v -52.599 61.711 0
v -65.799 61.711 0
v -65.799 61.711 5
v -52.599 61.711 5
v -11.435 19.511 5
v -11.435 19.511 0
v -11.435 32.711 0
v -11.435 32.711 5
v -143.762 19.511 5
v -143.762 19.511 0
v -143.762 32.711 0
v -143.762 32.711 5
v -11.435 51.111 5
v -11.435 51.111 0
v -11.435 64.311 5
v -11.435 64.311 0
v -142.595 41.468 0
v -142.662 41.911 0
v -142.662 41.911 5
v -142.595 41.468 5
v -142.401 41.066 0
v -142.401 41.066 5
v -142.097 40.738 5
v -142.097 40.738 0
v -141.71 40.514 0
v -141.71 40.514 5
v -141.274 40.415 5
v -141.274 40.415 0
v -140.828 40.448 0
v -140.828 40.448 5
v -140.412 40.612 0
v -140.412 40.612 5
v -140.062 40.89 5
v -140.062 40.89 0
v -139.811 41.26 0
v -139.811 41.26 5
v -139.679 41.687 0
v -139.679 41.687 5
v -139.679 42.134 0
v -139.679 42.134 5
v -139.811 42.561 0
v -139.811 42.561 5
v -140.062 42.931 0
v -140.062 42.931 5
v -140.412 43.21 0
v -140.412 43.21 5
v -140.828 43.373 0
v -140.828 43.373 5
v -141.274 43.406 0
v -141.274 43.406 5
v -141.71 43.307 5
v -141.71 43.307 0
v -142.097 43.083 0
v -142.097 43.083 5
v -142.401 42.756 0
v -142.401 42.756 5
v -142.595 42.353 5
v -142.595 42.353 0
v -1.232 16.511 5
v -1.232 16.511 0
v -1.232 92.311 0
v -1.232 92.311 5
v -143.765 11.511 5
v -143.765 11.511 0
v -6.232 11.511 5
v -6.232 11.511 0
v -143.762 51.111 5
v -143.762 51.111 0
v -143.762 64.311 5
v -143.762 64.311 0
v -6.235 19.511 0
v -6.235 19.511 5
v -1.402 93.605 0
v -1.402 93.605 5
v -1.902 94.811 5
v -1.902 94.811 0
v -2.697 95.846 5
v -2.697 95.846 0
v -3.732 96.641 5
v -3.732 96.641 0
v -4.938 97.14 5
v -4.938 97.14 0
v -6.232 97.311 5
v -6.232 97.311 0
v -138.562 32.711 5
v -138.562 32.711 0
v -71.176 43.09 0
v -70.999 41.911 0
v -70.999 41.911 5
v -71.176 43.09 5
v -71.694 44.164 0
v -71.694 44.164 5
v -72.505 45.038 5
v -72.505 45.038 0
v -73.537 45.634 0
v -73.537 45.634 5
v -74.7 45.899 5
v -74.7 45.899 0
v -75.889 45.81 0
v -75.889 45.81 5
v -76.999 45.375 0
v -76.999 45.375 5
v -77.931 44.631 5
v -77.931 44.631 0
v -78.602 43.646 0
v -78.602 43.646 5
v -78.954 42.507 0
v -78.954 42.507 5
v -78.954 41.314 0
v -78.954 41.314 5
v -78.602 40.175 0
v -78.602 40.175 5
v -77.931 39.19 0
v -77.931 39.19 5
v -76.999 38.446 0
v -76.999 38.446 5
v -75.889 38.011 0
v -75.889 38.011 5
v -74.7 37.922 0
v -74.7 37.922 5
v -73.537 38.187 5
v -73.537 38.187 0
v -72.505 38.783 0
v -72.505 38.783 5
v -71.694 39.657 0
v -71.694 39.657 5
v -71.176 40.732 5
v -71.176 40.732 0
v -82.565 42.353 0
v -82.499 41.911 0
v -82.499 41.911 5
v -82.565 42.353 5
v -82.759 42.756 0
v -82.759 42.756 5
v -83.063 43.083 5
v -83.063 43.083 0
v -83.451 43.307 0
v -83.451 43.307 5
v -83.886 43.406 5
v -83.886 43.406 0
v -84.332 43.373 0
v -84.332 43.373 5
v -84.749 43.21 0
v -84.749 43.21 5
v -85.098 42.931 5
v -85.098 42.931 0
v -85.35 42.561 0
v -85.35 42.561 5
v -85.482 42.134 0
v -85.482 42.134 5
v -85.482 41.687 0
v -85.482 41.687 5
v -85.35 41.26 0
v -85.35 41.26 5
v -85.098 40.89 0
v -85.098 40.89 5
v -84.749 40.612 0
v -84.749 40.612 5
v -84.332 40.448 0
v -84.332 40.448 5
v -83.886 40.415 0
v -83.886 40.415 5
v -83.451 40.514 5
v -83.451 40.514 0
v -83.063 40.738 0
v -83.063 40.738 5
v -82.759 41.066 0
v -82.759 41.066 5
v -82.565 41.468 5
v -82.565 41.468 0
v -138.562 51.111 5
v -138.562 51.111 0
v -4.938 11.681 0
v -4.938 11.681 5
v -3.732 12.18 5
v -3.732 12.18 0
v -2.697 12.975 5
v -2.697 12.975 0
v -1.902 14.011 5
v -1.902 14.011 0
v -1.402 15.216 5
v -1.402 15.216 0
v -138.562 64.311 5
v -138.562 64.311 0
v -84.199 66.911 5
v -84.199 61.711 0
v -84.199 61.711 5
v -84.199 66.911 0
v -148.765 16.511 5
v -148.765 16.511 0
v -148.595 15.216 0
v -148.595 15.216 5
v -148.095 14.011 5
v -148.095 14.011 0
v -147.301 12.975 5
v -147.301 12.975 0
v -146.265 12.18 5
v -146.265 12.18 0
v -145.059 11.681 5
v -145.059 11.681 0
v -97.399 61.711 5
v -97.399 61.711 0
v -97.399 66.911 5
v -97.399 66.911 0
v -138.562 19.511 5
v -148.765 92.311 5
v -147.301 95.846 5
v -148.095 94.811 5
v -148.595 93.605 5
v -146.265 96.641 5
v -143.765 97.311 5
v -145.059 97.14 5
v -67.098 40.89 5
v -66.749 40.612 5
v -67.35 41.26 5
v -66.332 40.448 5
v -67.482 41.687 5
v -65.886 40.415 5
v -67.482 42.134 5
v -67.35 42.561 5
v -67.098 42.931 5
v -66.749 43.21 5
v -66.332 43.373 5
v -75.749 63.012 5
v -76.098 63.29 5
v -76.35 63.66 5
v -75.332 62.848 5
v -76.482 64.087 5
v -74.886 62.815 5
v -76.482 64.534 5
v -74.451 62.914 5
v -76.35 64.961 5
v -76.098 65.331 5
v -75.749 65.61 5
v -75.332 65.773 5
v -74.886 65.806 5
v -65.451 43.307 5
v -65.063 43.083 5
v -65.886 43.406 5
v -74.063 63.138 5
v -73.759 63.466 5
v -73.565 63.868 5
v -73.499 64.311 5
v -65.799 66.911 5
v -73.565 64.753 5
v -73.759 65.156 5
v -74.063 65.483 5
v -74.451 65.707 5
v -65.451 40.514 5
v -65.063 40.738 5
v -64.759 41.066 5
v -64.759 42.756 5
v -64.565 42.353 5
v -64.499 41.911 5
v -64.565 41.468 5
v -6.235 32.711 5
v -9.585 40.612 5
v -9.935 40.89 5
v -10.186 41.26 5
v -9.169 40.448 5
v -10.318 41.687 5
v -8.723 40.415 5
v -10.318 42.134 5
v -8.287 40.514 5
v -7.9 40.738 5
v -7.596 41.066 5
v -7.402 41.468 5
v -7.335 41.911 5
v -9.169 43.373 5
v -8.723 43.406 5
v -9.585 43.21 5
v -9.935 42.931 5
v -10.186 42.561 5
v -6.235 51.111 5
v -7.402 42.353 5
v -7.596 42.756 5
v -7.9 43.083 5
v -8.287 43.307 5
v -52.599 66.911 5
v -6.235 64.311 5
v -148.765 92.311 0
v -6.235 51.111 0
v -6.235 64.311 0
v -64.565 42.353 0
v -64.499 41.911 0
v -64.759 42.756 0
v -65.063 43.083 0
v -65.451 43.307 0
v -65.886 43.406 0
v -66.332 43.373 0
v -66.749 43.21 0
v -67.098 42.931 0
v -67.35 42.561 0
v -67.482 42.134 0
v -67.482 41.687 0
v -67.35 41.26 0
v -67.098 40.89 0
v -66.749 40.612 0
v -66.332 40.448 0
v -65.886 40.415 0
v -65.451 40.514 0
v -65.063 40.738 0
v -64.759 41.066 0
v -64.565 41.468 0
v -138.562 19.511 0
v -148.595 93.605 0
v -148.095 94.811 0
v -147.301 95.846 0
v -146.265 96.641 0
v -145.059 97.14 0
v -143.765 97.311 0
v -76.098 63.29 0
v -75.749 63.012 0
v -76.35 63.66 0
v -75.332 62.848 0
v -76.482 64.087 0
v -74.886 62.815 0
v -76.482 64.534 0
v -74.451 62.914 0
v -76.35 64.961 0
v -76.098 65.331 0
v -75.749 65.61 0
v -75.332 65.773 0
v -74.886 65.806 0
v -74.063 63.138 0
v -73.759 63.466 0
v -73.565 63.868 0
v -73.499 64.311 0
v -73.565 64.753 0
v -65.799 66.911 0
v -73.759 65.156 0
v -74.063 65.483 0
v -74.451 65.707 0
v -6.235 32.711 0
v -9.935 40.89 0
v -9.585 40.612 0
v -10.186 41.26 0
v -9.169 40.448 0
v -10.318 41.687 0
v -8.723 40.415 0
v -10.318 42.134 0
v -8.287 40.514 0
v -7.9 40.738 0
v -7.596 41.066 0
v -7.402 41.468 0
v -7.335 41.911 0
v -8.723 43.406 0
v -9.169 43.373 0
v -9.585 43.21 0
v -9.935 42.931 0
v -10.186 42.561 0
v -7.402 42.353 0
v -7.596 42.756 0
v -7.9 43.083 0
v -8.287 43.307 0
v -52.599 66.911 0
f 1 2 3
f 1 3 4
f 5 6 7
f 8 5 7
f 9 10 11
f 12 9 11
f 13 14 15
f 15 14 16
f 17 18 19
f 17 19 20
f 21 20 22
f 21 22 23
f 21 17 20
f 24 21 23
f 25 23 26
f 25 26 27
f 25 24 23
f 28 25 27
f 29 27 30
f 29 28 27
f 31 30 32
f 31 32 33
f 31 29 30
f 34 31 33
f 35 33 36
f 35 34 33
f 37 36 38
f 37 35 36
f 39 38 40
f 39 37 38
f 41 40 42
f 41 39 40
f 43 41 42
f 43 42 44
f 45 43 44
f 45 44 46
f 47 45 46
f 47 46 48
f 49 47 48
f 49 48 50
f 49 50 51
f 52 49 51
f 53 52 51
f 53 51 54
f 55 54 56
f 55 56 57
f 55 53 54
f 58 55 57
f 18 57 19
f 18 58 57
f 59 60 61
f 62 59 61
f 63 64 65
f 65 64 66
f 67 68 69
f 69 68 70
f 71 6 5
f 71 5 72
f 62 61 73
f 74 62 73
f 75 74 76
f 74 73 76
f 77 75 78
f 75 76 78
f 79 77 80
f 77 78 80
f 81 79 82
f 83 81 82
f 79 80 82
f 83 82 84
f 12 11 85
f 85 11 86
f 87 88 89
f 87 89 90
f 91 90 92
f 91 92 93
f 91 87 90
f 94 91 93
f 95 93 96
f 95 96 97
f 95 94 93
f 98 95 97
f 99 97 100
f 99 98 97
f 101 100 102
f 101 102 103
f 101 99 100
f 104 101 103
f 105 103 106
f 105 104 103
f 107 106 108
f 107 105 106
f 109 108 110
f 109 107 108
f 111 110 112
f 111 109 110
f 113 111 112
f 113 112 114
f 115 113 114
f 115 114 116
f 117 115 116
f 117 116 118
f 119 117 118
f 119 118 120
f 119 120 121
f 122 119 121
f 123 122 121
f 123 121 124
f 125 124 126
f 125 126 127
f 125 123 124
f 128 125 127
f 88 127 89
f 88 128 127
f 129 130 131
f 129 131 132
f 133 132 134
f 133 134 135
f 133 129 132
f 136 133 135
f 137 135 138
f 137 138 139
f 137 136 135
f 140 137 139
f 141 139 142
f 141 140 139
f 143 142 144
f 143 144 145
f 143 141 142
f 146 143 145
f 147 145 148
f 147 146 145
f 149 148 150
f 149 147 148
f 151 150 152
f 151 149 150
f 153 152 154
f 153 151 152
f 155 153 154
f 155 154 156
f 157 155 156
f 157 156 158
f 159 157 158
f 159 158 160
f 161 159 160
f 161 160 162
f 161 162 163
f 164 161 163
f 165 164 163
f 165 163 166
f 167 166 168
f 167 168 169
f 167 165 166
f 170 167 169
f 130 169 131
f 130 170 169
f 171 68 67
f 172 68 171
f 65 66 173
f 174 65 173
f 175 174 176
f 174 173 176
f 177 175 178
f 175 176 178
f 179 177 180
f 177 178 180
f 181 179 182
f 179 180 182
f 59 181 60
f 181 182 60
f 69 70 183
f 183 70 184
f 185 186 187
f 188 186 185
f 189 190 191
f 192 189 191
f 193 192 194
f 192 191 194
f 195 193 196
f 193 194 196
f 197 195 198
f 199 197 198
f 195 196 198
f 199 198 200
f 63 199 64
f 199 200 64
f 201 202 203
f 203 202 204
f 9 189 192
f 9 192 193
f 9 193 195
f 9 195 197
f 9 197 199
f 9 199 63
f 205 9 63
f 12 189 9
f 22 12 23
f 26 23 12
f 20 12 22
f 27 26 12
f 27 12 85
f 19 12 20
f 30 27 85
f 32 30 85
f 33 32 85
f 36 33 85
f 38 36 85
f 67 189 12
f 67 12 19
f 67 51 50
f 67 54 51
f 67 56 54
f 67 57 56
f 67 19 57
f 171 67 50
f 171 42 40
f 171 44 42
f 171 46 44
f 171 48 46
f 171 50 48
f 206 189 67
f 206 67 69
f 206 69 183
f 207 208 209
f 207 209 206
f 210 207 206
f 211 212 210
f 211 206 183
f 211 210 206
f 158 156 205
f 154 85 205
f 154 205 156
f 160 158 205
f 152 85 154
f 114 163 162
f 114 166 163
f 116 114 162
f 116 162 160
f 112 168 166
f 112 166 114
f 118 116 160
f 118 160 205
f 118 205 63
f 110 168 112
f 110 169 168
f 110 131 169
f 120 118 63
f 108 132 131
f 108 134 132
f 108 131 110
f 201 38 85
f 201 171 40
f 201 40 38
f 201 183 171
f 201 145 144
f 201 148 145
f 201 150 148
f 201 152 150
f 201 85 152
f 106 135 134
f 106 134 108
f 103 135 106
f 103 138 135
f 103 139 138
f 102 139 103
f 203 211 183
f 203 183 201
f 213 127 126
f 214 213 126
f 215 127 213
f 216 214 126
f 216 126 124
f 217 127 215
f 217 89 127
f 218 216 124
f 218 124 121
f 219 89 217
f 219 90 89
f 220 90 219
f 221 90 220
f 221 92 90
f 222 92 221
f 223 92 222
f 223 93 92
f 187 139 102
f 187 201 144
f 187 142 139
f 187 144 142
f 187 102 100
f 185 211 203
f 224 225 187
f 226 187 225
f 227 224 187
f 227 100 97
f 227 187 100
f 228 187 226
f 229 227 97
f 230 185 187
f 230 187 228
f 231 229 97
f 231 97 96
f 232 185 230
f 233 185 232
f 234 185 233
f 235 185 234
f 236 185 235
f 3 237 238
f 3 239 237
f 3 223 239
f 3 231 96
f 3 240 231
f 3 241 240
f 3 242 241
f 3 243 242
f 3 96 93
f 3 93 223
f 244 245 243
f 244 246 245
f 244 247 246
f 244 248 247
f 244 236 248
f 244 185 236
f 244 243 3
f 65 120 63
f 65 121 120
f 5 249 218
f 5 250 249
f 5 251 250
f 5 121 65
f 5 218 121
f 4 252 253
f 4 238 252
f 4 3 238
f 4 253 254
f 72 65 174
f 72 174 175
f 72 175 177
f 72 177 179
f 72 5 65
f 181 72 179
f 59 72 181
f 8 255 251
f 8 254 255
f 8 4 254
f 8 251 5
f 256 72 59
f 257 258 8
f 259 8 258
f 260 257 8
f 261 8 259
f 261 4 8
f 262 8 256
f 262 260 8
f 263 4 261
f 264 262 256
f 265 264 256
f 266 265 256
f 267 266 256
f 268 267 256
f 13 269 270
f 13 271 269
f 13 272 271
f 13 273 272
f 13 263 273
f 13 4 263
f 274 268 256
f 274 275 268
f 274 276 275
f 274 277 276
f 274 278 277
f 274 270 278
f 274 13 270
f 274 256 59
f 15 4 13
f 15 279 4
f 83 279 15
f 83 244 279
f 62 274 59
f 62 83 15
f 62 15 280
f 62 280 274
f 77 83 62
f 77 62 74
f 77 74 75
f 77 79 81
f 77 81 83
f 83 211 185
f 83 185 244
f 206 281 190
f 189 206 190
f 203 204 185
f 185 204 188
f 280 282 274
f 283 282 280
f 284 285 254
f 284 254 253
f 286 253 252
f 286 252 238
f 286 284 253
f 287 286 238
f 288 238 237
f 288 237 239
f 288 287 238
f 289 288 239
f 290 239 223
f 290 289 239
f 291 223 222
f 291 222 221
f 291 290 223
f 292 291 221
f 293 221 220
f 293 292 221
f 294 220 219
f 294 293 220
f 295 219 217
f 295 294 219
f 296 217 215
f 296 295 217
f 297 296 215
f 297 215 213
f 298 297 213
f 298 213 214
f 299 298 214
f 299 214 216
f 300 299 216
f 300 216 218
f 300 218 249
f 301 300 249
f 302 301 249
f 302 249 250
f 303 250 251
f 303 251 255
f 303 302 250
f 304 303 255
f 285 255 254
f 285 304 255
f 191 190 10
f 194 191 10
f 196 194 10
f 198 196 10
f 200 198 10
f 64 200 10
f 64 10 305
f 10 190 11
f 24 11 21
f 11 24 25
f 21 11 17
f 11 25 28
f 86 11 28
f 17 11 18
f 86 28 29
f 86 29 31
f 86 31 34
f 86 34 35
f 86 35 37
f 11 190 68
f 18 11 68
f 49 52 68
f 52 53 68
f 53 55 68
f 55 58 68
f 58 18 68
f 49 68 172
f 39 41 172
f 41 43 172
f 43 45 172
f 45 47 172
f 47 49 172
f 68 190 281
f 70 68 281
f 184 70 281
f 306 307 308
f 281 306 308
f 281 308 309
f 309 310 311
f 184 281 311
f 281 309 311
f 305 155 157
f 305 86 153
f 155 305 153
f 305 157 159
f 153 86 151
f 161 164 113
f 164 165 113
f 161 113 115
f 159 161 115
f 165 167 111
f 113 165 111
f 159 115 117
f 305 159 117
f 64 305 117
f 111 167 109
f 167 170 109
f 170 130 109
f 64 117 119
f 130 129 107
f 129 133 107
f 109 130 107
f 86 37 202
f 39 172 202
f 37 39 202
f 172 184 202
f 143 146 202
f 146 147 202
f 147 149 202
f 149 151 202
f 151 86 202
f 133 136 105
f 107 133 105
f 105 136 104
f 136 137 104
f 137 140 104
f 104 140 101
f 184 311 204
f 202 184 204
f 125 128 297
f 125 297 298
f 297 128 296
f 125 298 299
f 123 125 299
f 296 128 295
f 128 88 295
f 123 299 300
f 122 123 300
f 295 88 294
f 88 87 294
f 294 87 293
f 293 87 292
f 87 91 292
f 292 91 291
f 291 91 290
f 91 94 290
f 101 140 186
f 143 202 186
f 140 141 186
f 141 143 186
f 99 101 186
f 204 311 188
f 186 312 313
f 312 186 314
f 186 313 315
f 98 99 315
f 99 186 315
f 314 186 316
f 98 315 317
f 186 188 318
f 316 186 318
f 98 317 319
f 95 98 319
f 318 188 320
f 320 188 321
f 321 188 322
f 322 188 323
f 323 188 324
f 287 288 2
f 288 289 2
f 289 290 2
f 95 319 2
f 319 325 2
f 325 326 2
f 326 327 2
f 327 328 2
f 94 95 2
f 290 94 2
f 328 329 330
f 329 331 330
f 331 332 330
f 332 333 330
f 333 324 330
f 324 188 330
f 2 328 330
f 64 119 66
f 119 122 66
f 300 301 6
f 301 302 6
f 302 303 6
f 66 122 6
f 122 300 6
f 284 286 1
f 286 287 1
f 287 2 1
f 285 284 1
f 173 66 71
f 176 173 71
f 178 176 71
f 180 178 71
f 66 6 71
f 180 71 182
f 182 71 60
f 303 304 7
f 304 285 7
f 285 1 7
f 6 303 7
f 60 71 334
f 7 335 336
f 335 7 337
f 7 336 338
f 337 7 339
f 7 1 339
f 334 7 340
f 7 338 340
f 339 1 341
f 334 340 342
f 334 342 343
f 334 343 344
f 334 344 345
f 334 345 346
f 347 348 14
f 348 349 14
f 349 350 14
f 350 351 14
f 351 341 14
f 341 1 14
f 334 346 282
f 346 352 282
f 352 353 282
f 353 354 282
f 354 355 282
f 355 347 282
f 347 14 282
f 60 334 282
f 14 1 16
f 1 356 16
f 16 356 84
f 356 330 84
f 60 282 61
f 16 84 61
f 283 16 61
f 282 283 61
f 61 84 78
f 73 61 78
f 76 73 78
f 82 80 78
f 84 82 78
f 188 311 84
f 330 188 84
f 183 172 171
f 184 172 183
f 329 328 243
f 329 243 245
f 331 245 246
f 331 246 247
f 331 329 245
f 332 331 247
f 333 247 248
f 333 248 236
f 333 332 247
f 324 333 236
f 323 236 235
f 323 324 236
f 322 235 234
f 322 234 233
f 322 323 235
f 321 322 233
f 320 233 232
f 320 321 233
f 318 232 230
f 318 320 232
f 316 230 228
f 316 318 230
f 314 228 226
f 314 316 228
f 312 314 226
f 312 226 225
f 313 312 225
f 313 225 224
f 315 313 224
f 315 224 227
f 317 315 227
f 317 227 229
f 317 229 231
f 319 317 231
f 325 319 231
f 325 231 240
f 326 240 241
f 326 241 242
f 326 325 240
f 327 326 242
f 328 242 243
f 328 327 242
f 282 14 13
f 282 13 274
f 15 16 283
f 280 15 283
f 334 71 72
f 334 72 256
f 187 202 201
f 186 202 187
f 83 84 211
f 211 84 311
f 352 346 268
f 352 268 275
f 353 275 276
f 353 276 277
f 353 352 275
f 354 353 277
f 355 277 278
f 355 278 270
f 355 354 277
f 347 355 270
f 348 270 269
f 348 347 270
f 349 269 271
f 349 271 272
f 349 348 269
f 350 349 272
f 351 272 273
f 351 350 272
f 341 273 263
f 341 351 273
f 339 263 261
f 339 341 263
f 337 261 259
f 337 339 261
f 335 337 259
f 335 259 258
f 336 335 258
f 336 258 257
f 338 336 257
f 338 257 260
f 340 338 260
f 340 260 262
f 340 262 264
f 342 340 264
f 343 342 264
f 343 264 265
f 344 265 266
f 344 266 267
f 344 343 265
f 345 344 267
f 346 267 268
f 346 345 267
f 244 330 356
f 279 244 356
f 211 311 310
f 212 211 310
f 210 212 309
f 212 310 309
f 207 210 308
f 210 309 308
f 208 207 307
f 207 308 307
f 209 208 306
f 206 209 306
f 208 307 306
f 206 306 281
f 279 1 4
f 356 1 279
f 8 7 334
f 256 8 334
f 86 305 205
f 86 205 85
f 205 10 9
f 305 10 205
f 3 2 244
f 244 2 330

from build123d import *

# Parameters (mm, degrees)
SKETCH1_R           = 4
SKETCH1_R_2         = 1.5
SKETCH1_W           = 5.2
SKETCH1_H           = 13.2
SKETCH1_W_2         = 13.2
SKETCH1_H_2         = 5.2
BOSS_EXTRUDE1_DEPTH = 5


with BuildPart() as part:
    # Sketch1 → Boss-Extrude1 (new body)
    with BuildSketch(Plane.XY):
        with BuildLine():
            Line((-6.232072687, 97.310592398), (-143.765004629, 97.310592398))
            ThreePointArc((-143.765004629, 97.310592398), (-147.300538535, 95.846126304), (-148.765004629, 92.310592398))
            Line((-148.765004629, 92.310592398), (-148.765004629, 16.510592398))
            ThreePointArc((-148.765004629, 16.510592398), (-147.300538535, 12.975058492), (-143.765004629, 11.510592398))
            Line((-143.765004629, 11.510592398), (-6.232072687, 11.510592398))
            ThreePointArc((-6.232072687, 11.510592398), (-2.696538781, 12.975058492), (-1.232072687, 16.510592398))
            Line((-1.232072687, 16.510592398), (-1.232072687, 92.310592398))
            ThreePointArc((-1.232072687, 92.310592398), (-2.696538781, 95.846126304), (-6.232072687, 97.310592398))
        make_face()
        with Locations((-74.998538658, 41.910592398)):
            Circle(SKETCH1_R, mode=Mode.SUBTRACT)
        with Locations((-83.998538658, 41.910592398)):
            Circle(SKETCH1_R_2, mode=Mode.SUBTRACT)
        with Locations((-65.998538658, 41.910592398)):
            Circle(SKETCH1_R_2, mode=Mode.SUBTRACT)
        with Locations((-8.835038658, 41.910592398)):
            Circle(SKETCH1_R_2, mode=Mode.SUBTRACT)
        with Locations(Location((-141.162038658, 41.910592398, 0), (0, 0, 180))):
            Circle(SKETCH1_R_2, mode=Mode.SUBTRACT)
        with Locations((-74.998538658, 64.310592398)):
            Circle(SKETCH1_R_2, mode=Mode.SUBTRACT)
        with Locations((-8.835038658, 26.110592398)):
            Rectangle(SKETCH1_W, SKETCH1_H, mode=Mode.SUBTRACT)
        with Locations((-8.835038658, 57.710592398)):
            Rectangle(SKETCH1_W, SKETCH1_H, mode=Mode.SUBTRACT)
        with Locations((-59.198538658, 64.310592398)):
            Rectangle(SKETCH1_W_2, SKETCH1_H_2, mode=Mode.SUBTRACT)
        with Locations((-90.798538658, 64.310592398)):
            Rectangle(SKETCH1_W_2, SKETCH1_H_2, mode=Mode.SUBTRACT)
        with Locations((-141.162038658, 57.710592398)):
            Rectangle(SKETCH1_W, SKETCH1_H, mode=Mode.SUBTRACT)
        with Locations((-141.162038658, 26.110592398)):
            Rectangle(SKETCH1_W, SKETCH1_H, mode=Mode.SUBTRACT)
    extrude(amount=BOSS_EXTRUDE1_DEPTH)


solid = part.part
